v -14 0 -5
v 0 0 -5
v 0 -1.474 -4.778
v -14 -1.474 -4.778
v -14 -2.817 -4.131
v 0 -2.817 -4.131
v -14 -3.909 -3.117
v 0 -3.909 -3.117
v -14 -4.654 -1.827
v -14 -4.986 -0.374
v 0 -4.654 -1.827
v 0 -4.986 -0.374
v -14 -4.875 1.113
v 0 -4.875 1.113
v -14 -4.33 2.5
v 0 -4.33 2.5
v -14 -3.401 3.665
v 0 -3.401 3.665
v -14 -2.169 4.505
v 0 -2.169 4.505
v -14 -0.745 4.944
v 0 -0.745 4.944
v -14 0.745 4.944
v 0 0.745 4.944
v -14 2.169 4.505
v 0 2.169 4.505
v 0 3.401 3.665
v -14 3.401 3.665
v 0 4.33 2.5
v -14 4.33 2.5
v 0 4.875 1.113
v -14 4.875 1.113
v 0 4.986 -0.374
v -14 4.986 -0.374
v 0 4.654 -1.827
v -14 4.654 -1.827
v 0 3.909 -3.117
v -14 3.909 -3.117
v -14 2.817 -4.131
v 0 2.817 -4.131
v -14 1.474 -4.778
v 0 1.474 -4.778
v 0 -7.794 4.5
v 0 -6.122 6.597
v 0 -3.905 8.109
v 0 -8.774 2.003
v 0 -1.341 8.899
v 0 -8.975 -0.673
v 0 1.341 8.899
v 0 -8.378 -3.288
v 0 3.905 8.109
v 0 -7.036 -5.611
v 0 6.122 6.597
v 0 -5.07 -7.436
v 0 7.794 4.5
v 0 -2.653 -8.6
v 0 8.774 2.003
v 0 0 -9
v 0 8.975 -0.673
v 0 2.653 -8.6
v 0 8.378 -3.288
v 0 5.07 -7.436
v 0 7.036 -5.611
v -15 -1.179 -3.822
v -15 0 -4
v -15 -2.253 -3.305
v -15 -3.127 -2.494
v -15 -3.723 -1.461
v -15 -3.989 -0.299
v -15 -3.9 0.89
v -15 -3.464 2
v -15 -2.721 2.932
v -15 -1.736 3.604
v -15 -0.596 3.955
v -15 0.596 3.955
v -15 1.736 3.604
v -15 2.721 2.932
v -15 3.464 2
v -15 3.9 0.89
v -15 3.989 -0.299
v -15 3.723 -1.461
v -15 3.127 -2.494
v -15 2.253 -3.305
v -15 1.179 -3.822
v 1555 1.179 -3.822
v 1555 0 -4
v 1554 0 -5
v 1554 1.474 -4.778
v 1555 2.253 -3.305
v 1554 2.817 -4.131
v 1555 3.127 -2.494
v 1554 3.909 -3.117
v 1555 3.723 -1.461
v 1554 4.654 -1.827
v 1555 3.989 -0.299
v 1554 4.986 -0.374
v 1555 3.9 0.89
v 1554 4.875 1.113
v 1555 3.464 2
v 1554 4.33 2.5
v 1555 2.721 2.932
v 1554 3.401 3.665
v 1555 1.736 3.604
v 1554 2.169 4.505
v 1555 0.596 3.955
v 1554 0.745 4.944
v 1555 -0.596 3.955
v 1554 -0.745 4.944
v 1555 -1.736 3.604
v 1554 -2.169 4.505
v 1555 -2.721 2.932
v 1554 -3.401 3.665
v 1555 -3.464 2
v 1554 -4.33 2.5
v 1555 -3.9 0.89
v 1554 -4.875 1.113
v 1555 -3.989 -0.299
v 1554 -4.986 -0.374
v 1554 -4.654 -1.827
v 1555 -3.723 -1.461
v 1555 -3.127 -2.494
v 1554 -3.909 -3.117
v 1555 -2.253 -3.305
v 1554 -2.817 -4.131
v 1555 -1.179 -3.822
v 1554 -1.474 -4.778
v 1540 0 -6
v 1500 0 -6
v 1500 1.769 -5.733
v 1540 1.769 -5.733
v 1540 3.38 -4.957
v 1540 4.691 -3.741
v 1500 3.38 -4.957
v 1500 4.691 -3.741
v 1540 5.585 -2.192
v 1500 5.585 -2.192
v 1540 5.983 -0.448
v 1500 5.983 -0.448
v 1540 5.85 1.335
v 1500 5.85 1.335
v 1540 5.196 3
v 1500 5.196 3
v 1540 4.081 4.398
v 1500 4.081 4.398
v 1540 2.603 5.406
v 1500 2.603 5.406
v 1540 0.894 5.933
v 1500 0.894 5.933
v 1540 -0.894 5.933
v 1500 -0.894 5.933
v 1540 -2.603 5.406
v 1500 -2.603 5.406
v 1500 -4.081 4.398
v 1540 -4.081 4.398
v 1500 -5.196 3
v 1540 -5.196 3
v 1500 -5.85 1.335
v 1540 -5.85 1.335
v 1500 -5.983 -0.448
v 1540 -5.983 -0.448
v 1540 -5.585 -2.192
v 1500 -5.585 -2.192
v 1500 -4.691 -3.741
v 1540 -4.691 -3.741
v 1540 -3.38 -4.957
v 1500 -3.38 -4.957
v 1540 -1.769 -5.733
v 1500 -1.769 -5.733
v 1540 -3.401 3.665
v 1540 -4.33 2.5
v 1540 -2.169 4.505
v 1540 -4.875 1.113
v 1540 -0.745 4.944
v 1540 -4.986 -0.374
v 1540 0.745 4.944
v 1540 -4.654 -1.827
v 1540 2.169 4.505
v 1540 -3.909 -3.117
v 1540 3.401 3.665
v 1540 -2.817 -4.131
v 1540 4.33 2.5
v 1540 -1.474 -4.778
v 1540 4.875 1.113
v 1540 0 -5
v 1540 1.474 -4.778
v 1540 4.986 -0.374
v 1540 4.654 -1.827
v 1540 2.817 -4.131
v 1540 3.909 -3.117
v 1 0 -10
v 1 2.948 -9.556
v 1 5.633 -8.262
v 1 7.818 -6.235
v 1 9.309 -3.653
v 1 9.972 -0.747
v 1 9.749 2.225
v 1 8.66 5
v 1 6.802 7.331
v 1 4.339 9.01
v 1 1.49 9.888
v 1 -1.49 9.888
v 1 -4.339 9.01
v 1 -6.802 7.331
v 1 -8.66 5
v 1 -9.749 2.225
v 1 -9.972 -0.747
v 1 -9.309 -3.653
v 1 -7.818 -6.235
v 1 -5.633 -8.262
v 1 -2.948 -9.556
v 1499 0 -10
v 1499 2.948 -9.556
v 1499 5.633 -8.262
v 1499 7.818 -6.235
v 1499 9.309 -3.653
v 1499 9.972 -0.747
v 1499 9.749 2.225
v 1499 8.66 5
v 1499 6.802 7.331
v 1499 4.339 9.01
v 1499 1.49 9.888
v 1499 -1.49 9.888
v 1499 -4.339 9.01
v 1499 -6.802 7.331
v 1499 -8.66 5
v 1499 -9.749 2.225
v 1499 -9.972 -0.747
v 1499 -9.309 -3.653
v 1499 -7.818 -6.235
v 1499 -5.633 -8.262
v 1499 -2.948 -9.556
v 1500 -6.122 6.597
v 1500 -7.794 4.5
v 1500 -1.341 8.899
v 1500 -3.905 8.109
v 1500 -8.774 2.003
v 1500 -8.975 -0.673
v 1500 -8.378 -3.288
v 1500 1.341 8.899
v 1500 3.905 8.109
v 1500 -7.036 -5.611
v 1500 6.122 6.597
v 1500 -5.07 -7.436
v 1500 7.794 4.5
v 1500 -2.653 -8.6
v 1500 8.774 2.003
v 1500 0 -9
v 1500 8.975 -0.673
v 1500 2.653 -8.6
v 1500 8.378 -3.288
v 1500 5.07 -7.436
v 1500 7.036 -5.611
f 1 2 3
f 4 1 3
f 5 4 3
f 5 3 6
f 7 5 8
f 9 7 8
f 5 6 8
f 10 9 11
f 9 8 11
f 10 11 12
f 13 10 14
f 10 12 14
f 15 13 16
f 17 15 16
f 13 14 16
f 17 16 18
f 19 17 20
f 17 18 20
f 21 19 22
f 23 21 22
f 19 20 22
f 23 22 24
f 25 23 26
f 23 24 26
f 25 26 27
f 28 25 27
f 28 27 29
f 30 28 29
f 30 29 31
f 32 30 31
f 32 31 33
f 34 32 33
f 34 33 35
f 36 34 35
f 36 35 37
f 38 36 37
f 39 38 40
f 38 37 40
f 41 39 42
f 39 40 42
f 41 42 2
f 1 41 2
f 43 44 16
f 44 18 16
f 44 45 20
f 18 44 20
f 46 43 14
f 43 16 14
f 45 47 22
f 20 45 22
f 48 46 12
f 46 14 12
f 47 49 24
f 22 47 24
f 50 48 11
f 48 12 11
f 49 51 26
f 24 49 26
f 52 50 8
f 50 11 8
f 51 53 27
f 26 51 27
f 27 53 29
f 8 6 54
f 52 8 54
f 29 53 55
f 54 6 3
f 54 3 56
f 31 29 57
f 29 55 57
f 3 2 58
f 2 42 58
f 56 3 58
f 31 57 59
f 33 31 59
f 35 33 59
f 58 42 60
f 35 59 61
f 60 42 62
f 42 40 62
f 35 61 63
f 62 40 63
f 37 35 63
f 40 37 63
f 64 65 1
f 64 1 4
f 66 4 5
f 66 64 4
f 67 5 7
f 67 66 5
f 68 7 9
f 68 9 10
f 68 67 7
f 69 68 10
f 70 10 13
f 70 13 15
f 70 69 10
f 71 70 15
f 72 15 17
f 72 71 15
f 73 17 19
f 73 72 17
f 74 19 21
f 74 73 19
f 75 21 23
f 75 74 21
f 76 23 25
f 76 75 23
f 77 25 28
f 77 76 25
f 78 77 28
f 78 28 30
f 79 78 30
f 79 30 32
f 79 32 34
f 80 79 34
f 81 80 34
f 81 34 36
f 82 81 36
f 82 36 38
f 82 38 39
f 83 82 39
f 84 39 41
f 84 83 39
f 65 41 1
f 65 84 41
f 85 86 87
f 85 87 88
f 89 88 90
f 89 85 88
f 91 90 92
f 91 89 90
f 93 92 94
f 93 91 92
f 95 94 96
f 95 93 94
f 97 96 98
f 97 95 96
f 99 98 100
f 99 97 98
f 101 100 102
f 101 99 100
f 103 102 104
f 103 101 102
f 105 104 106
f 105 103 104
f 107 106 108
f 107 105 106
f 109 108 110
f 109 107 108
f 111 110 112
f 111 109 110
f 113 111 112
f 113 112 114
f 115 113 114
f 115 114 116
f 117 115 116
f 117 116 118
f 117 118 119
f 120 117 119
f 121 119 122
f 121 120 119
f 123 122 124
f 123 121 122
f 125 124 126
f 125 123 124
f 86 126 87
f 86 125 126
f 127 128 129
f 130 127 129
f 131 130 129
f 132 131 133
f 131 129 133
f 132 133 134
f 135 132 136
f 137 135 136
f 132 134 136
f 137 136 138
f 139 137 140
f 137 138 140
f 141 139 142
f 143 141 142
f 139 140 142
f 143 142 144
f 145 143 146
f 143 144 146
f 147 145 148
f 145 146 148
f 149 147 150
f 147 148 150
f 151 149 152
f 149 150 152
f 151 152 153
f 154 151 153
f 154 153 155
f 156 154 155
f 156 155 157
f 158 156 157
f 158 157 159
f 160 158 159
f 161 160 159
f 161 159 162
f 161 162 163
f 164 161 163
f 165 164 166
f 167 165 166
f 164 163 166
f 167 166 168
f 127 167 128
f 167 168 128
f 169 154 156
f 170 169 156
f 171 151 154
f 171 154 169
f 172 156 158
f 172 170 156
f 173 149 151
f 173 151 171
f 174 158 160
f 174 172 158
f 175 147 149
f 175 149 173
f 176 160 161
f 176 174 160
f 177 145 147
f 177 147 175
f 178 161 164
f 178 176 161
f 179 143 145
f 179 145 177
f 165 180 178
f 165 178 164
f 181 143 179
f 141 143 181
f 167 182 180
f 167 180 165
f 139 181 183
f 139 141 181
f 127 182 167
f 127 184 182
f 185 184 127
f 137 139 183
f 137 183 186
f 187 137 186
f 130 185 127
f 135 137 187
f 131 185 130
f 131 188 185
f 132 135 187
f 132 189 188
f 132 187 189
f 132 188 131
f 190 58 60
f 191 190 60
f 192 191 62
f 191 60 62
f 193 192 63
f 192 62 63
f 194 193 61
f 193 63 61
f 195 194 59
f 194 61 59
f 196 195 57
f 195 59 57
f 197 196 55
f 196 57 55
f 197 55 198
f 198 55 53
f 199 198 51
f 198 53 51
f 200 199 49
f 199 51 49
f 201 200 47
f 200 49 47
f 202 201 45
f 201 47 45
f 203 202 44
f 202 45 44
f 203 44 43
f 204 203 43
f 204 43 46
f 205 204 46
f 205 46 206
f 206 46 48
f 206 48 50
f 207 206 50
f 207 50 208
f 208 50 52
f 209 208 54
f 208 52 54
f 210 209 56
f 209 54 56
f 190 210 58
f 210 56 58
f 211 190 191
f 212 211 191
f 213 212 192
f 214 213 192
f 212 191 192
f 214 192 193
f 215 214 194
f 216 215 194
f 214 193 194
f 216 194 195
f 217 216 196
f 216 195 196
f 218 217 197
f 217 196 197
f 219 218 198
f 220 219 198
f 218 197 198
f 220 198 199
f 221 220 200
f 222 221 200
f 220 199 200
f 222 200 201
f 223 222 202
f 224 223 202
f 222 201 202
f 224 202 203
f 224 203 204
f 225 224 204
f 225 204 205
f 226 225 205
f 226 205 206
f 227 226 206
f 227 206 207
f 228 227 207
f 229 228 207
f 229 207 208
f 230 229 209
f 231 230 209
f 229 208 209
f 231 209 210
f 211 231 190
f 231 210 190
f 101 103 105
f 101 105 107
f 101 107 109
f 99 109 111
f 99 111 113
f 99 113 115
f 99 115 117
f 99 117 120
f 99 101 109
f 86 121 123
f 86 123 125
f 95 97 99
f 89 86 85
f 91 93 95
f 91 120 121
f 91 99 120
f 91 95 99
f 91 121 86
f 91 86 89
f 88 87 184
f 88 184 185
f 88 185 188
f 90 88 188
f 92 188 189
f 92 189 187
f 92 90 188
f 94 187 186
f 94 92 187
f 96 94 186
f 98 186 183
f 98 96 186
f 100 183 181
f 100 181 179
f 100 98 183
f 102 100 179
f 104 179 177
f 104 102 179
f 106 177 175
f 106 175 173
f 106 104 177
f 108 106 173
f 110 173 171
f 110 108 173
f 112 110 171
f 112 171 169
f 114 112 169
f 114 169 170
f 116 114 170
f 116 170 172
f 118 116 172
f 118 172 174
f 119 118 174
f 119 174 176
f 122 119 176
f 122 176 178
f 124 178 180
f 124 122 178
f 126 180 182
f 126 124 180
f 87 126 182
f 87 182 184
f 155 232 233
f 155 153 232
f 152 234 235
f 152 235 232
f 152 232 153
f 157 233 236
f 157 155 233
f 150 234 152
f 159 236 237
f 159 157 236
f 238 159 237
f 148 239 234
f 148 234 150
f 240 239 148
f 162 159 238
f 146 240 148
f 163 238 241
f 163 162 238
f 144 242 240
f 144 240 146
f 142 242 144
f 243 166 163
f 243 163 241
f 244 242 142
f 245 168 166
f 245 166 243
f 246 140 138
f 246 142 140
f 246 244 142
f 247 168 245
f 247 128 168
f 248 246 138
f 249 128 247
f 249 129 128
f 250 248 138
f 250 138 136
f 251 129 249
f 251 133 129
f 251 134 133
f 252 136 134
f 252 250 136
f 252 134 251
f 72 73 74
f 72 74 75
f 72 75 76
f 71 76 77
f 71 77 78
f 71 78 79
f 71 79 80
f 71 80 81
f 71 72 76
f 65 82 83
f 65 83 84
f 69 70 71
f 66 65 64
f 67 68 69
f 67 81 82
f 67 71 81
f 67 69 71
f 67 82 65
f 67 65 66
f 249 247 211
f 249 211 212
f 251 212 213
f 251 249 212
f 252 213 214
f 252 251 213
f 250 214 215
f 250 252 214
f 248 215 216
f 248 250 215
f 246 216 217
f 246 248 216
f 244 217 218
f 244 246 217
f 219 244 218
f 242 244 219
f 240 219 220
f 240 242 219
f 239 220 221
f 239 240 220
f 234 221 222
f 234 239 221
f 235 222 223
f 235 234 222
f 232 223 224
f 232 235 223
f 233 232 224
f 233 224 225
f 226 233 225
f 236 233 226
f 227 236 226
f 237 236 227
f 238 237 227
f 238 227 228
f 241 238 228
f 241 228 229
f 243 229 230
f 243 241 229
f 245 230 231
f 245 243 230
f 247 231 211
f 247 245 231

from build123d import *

# Parameters (mm, degrees)
SKETCH_1_R      = 10
EXTRUDE_1_DEPTH = 1500
SKETCH_2_R      = 5
EXTRUDE_3_DEPTH = 15
SKETCH_3_R      = 6
EXTRUDE_4_DEPTH = 40
EXTRUDE_START   = 15
SKETCH_4_R      = 5
EXTRUDE_5_DEPTH = 15
CHAMFER_4_SIZE  = 1
CHAMFER_5_SIZE  = 1


with BuildPart() as part:
    # Эскиз1 → Бобышка-Вытянуть1 (new body)
    with BuildSketch(Plane(origin=(0, 0, 0), x_dir=(0, 0, -1), z_dir=(1, 0, 0))):
        Circle(SKETCH_1_R)
    extrude(amount=EXTRUDE_1_DEPTH)

    # Эскиз2 → Бобышка-Вытянуть3 (add)
    with BuildSketch(Plane.ZY):
        with Locations(Location((0, 0, 0), (0, 0, 180))):
            Circle(SKETCH_2_R)
    extrude(amount=EXTRUDE_3_DEPTH)

    # Эскиз3 → Бобышка-Вытянуть4 (add)
    with BuildSketch(Plane(origin=(1500, 0, 0), x_dir=(0, 0, -1), z_dir=(1, 0, 0))):
        Circle(SKETCH_3_R)
    extrude(amount=EXTRUDE_4_DEPTH)

    # Эскиз4 → Бобышка-Вытянуть5 (add)
    with BuildSketch(Plane(origin=(1540, 0, 0), x_dir=(0, 0, -1), z_dir=(1, 0, 0)).offset(EXTRUDE_START)):
        Circle(SKETCH_4_R)
    extrude(amount=-EXTRUDE_5_DEPTH)

    # Фаска4
    chamfer_4_edges = [part.edges().sort_by_distance(p)[0] for p in [
        (1555, 0, 5),
        (1500, 0, 10),
    ]]
    chamfer(chamfer_4_edges, length=CHAMFER_4_SIZE)

    # Фаска5
    chamfer_5_edges = [part.edges().sort_by_distance(p)[0] for p in [
        (0, 0, 10),
        (-15, 0, 5),
    ]]
    chamfer(chamfer_5_edges, length=CHAMFER_5_SIZE)


solid = part.part
